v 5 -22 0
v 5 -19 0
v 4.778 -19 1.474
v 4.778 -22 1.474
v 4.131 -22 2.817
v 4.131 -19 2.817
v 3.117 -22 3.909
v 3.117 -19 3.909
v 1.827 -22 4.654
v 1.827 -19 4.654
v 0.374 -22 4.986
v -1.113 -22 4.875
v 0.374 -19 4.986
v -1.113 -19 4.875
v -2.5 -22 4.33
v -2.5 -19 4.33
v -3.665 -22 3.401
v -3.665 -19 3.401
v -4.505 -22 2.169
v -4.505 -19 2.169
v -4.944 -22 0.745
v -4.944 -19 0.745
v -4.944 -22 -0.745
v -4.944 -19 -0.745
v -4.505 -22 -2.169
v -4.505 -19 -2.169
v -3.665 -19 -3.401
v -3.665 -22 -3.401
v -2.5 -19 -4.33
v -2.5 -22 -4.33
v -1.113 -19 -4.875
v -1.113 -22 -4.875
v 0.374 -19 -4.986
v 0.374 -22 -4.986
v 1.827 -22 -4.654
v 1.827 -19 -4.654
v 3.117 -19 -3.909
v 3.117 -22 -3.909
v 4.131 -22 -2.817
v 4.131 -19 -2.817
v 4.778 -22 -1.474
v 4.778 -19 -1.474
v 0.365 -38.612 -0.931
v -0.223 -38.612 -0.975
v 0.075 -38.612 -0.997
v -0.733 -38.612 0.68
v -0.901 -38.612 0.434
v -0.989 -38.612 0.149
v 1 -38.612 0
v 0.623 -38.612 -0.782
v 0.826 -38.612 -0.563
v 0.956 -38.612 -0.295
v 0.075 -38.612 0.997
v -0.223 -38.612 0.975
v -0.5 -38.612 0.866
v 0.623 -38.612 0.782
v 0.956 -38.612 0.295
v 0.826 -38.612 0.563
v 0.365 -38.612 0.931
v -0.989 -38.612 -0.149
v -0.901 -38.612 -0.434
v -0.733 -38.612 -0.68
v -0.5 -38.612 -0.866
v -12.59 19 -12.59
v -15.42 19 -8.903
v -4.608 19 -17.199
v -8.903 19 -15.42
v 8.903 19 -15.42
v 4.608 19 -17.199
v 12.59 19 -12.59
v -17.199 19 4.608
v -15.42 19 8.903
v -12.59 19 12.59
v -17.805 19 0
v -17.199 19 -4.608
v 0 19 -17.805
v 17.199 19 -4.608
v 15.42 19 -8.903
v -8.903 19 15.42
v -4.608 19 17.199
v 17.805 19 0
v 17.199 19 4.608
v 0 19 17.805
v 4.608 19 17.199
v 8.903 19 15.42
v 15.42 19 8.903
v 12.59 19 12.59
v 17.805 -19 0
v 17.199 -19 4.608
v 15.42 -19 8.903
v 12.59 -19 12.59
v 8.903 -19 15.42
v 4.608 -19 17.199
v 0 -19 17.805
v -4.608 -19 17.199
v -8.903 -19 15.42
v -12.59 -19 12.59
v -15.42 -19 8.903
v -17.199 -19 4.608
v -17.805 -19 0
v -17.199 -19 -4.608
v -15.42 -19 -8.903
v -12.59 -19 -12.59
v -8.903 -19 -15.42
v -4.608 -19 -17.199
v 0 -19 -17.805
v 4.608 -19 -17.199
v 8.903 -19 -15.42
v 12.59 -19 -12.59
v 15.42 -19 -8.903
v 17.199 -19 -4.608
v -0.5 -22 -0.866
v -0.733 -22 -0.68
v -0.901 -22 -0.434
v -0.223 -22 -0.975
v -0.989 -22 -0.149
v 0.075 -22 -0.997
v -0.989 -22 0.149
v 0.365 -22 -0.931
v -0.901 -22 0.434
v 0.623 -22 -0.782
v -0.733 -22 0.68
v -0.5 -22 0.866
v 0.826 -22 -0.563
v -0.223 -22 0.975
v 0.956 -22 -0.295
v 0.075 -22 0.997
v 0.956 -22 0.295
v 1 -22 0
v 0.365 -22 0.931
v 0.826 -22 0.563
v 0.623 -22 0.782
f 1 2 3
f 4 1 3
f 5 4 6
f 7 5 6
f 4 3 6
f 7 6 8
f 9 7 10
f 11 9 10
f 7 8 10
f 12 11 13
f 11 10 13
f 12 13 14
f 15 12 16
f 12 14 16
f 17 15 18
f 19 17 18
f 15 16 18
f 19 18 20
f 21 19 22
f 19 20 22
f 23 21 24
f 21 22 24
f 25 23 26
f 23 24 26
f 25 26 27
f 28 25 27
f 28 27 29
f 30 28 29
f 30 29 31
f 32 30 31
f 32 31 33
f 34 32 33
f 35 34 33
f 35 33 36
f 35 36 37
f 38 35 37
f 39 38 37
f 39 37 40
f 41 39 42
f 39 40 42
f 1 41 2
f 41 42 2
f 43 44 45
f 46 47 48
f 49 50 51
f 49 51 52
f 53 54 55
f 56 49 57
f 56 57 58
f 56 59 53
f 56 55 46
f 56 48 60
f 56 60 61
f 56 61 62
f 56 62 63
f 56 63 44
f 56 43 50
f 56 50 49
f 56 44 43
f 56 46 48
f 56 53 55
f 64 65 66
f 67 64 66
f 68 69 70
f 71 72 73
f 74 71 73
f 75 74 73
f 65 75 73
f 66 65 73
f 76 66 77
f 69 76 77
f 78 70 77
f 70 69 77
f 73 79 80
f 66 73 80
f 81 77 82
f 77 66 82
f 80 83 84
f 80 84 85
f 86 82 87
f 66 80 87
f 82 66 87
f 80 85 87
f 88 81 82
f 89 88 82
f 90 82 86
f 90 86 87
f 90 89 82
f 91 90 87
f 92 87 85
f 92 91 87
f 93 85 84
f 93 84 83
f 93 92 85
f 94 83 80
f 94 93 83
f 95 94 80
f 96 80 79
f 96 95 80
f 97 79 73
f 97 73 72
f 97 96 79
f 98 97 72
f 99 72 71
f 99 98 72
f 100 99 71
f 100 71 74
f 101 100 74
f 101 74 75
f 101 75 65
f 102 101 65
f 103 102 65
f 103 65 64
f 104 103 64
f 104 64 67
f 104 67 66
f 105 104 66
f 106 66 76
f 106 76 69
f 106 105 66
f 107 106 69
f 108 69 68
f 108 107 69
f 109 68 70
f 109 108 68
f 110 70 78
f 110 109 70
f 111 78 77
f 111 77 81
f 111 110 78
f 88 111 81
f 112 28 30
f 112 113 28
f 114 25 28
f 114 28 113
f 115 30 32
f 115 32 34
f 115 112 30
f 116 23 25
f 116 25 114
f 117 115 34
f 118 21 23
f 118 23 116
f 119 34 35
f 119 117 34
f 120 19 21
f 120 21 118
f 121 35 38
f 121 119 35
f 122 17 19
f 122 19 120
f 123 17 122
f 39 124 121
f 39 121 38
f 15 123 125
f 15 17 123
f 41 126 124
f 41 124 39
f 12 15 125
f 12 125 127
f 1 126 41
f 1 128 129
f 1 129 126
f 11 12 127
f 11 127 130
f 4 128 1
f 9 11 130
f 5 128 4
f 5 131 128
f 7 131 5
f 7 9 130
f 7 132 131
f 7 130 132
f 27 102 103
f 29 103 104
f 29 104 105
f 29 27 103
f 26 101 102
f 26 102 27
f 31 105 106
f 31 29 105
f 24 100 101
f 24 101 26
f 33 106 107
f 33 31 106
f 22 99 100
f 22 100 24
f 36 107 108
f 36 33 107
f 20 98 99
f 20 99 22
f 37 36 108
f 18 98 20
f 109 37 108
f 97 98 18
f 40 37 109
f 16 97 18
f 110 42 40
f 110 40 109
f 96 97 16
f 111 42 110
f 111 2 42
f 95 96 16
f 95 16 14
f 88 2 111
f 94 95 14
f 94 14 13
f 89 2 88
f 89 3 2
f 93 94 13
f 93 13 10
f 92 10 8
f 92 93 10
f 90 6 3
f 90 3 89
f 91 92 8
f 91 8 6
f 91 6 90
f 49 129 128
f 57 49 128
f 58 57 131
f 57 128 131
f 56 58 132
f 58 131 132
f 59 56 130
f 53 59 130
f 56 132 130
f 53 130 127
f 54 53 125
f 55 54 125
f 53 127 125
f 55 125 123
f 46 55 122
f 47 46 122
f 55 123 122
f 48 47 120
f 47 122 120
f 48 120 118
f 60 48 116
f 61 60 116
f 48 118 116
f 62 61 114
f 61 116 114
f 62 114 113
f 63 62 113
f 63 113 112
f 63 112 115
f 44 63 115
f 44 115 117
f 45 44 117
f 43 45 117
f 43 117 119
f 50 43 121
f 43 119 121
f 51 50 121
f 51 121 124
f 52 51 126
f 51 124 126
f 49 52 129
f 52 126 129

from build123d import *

# Parameters (mm, degrees)
F0_R     = 17.8054
F1_DEPTH = 19
F2_R     = 5
F3_DEPTH = 3
F4_R     = 1
F5_DEPTH = 16.6116


with BuildPart() as f1:
    # F0 (on Front) → F1 (new body, symmetric)
    with BuildSketch(Plane.XZ):
        Circle(F0_R)
    extrude(amount=F1_DEPTH, both=True)

    # F2 (on face) → F3 (join)
    with BuildSketch(Plane.XZ.offset(19)):
        Circle(F2_R)
    extrude(amount=F3_DEPTH)

    # F4 (on face) → F5 (join)
    with BuildSketch(Plane.XZ.offset(22)):
        Circle(F4_R)
    extrude(amount=F5_DEPTH)


solid = f1.part
